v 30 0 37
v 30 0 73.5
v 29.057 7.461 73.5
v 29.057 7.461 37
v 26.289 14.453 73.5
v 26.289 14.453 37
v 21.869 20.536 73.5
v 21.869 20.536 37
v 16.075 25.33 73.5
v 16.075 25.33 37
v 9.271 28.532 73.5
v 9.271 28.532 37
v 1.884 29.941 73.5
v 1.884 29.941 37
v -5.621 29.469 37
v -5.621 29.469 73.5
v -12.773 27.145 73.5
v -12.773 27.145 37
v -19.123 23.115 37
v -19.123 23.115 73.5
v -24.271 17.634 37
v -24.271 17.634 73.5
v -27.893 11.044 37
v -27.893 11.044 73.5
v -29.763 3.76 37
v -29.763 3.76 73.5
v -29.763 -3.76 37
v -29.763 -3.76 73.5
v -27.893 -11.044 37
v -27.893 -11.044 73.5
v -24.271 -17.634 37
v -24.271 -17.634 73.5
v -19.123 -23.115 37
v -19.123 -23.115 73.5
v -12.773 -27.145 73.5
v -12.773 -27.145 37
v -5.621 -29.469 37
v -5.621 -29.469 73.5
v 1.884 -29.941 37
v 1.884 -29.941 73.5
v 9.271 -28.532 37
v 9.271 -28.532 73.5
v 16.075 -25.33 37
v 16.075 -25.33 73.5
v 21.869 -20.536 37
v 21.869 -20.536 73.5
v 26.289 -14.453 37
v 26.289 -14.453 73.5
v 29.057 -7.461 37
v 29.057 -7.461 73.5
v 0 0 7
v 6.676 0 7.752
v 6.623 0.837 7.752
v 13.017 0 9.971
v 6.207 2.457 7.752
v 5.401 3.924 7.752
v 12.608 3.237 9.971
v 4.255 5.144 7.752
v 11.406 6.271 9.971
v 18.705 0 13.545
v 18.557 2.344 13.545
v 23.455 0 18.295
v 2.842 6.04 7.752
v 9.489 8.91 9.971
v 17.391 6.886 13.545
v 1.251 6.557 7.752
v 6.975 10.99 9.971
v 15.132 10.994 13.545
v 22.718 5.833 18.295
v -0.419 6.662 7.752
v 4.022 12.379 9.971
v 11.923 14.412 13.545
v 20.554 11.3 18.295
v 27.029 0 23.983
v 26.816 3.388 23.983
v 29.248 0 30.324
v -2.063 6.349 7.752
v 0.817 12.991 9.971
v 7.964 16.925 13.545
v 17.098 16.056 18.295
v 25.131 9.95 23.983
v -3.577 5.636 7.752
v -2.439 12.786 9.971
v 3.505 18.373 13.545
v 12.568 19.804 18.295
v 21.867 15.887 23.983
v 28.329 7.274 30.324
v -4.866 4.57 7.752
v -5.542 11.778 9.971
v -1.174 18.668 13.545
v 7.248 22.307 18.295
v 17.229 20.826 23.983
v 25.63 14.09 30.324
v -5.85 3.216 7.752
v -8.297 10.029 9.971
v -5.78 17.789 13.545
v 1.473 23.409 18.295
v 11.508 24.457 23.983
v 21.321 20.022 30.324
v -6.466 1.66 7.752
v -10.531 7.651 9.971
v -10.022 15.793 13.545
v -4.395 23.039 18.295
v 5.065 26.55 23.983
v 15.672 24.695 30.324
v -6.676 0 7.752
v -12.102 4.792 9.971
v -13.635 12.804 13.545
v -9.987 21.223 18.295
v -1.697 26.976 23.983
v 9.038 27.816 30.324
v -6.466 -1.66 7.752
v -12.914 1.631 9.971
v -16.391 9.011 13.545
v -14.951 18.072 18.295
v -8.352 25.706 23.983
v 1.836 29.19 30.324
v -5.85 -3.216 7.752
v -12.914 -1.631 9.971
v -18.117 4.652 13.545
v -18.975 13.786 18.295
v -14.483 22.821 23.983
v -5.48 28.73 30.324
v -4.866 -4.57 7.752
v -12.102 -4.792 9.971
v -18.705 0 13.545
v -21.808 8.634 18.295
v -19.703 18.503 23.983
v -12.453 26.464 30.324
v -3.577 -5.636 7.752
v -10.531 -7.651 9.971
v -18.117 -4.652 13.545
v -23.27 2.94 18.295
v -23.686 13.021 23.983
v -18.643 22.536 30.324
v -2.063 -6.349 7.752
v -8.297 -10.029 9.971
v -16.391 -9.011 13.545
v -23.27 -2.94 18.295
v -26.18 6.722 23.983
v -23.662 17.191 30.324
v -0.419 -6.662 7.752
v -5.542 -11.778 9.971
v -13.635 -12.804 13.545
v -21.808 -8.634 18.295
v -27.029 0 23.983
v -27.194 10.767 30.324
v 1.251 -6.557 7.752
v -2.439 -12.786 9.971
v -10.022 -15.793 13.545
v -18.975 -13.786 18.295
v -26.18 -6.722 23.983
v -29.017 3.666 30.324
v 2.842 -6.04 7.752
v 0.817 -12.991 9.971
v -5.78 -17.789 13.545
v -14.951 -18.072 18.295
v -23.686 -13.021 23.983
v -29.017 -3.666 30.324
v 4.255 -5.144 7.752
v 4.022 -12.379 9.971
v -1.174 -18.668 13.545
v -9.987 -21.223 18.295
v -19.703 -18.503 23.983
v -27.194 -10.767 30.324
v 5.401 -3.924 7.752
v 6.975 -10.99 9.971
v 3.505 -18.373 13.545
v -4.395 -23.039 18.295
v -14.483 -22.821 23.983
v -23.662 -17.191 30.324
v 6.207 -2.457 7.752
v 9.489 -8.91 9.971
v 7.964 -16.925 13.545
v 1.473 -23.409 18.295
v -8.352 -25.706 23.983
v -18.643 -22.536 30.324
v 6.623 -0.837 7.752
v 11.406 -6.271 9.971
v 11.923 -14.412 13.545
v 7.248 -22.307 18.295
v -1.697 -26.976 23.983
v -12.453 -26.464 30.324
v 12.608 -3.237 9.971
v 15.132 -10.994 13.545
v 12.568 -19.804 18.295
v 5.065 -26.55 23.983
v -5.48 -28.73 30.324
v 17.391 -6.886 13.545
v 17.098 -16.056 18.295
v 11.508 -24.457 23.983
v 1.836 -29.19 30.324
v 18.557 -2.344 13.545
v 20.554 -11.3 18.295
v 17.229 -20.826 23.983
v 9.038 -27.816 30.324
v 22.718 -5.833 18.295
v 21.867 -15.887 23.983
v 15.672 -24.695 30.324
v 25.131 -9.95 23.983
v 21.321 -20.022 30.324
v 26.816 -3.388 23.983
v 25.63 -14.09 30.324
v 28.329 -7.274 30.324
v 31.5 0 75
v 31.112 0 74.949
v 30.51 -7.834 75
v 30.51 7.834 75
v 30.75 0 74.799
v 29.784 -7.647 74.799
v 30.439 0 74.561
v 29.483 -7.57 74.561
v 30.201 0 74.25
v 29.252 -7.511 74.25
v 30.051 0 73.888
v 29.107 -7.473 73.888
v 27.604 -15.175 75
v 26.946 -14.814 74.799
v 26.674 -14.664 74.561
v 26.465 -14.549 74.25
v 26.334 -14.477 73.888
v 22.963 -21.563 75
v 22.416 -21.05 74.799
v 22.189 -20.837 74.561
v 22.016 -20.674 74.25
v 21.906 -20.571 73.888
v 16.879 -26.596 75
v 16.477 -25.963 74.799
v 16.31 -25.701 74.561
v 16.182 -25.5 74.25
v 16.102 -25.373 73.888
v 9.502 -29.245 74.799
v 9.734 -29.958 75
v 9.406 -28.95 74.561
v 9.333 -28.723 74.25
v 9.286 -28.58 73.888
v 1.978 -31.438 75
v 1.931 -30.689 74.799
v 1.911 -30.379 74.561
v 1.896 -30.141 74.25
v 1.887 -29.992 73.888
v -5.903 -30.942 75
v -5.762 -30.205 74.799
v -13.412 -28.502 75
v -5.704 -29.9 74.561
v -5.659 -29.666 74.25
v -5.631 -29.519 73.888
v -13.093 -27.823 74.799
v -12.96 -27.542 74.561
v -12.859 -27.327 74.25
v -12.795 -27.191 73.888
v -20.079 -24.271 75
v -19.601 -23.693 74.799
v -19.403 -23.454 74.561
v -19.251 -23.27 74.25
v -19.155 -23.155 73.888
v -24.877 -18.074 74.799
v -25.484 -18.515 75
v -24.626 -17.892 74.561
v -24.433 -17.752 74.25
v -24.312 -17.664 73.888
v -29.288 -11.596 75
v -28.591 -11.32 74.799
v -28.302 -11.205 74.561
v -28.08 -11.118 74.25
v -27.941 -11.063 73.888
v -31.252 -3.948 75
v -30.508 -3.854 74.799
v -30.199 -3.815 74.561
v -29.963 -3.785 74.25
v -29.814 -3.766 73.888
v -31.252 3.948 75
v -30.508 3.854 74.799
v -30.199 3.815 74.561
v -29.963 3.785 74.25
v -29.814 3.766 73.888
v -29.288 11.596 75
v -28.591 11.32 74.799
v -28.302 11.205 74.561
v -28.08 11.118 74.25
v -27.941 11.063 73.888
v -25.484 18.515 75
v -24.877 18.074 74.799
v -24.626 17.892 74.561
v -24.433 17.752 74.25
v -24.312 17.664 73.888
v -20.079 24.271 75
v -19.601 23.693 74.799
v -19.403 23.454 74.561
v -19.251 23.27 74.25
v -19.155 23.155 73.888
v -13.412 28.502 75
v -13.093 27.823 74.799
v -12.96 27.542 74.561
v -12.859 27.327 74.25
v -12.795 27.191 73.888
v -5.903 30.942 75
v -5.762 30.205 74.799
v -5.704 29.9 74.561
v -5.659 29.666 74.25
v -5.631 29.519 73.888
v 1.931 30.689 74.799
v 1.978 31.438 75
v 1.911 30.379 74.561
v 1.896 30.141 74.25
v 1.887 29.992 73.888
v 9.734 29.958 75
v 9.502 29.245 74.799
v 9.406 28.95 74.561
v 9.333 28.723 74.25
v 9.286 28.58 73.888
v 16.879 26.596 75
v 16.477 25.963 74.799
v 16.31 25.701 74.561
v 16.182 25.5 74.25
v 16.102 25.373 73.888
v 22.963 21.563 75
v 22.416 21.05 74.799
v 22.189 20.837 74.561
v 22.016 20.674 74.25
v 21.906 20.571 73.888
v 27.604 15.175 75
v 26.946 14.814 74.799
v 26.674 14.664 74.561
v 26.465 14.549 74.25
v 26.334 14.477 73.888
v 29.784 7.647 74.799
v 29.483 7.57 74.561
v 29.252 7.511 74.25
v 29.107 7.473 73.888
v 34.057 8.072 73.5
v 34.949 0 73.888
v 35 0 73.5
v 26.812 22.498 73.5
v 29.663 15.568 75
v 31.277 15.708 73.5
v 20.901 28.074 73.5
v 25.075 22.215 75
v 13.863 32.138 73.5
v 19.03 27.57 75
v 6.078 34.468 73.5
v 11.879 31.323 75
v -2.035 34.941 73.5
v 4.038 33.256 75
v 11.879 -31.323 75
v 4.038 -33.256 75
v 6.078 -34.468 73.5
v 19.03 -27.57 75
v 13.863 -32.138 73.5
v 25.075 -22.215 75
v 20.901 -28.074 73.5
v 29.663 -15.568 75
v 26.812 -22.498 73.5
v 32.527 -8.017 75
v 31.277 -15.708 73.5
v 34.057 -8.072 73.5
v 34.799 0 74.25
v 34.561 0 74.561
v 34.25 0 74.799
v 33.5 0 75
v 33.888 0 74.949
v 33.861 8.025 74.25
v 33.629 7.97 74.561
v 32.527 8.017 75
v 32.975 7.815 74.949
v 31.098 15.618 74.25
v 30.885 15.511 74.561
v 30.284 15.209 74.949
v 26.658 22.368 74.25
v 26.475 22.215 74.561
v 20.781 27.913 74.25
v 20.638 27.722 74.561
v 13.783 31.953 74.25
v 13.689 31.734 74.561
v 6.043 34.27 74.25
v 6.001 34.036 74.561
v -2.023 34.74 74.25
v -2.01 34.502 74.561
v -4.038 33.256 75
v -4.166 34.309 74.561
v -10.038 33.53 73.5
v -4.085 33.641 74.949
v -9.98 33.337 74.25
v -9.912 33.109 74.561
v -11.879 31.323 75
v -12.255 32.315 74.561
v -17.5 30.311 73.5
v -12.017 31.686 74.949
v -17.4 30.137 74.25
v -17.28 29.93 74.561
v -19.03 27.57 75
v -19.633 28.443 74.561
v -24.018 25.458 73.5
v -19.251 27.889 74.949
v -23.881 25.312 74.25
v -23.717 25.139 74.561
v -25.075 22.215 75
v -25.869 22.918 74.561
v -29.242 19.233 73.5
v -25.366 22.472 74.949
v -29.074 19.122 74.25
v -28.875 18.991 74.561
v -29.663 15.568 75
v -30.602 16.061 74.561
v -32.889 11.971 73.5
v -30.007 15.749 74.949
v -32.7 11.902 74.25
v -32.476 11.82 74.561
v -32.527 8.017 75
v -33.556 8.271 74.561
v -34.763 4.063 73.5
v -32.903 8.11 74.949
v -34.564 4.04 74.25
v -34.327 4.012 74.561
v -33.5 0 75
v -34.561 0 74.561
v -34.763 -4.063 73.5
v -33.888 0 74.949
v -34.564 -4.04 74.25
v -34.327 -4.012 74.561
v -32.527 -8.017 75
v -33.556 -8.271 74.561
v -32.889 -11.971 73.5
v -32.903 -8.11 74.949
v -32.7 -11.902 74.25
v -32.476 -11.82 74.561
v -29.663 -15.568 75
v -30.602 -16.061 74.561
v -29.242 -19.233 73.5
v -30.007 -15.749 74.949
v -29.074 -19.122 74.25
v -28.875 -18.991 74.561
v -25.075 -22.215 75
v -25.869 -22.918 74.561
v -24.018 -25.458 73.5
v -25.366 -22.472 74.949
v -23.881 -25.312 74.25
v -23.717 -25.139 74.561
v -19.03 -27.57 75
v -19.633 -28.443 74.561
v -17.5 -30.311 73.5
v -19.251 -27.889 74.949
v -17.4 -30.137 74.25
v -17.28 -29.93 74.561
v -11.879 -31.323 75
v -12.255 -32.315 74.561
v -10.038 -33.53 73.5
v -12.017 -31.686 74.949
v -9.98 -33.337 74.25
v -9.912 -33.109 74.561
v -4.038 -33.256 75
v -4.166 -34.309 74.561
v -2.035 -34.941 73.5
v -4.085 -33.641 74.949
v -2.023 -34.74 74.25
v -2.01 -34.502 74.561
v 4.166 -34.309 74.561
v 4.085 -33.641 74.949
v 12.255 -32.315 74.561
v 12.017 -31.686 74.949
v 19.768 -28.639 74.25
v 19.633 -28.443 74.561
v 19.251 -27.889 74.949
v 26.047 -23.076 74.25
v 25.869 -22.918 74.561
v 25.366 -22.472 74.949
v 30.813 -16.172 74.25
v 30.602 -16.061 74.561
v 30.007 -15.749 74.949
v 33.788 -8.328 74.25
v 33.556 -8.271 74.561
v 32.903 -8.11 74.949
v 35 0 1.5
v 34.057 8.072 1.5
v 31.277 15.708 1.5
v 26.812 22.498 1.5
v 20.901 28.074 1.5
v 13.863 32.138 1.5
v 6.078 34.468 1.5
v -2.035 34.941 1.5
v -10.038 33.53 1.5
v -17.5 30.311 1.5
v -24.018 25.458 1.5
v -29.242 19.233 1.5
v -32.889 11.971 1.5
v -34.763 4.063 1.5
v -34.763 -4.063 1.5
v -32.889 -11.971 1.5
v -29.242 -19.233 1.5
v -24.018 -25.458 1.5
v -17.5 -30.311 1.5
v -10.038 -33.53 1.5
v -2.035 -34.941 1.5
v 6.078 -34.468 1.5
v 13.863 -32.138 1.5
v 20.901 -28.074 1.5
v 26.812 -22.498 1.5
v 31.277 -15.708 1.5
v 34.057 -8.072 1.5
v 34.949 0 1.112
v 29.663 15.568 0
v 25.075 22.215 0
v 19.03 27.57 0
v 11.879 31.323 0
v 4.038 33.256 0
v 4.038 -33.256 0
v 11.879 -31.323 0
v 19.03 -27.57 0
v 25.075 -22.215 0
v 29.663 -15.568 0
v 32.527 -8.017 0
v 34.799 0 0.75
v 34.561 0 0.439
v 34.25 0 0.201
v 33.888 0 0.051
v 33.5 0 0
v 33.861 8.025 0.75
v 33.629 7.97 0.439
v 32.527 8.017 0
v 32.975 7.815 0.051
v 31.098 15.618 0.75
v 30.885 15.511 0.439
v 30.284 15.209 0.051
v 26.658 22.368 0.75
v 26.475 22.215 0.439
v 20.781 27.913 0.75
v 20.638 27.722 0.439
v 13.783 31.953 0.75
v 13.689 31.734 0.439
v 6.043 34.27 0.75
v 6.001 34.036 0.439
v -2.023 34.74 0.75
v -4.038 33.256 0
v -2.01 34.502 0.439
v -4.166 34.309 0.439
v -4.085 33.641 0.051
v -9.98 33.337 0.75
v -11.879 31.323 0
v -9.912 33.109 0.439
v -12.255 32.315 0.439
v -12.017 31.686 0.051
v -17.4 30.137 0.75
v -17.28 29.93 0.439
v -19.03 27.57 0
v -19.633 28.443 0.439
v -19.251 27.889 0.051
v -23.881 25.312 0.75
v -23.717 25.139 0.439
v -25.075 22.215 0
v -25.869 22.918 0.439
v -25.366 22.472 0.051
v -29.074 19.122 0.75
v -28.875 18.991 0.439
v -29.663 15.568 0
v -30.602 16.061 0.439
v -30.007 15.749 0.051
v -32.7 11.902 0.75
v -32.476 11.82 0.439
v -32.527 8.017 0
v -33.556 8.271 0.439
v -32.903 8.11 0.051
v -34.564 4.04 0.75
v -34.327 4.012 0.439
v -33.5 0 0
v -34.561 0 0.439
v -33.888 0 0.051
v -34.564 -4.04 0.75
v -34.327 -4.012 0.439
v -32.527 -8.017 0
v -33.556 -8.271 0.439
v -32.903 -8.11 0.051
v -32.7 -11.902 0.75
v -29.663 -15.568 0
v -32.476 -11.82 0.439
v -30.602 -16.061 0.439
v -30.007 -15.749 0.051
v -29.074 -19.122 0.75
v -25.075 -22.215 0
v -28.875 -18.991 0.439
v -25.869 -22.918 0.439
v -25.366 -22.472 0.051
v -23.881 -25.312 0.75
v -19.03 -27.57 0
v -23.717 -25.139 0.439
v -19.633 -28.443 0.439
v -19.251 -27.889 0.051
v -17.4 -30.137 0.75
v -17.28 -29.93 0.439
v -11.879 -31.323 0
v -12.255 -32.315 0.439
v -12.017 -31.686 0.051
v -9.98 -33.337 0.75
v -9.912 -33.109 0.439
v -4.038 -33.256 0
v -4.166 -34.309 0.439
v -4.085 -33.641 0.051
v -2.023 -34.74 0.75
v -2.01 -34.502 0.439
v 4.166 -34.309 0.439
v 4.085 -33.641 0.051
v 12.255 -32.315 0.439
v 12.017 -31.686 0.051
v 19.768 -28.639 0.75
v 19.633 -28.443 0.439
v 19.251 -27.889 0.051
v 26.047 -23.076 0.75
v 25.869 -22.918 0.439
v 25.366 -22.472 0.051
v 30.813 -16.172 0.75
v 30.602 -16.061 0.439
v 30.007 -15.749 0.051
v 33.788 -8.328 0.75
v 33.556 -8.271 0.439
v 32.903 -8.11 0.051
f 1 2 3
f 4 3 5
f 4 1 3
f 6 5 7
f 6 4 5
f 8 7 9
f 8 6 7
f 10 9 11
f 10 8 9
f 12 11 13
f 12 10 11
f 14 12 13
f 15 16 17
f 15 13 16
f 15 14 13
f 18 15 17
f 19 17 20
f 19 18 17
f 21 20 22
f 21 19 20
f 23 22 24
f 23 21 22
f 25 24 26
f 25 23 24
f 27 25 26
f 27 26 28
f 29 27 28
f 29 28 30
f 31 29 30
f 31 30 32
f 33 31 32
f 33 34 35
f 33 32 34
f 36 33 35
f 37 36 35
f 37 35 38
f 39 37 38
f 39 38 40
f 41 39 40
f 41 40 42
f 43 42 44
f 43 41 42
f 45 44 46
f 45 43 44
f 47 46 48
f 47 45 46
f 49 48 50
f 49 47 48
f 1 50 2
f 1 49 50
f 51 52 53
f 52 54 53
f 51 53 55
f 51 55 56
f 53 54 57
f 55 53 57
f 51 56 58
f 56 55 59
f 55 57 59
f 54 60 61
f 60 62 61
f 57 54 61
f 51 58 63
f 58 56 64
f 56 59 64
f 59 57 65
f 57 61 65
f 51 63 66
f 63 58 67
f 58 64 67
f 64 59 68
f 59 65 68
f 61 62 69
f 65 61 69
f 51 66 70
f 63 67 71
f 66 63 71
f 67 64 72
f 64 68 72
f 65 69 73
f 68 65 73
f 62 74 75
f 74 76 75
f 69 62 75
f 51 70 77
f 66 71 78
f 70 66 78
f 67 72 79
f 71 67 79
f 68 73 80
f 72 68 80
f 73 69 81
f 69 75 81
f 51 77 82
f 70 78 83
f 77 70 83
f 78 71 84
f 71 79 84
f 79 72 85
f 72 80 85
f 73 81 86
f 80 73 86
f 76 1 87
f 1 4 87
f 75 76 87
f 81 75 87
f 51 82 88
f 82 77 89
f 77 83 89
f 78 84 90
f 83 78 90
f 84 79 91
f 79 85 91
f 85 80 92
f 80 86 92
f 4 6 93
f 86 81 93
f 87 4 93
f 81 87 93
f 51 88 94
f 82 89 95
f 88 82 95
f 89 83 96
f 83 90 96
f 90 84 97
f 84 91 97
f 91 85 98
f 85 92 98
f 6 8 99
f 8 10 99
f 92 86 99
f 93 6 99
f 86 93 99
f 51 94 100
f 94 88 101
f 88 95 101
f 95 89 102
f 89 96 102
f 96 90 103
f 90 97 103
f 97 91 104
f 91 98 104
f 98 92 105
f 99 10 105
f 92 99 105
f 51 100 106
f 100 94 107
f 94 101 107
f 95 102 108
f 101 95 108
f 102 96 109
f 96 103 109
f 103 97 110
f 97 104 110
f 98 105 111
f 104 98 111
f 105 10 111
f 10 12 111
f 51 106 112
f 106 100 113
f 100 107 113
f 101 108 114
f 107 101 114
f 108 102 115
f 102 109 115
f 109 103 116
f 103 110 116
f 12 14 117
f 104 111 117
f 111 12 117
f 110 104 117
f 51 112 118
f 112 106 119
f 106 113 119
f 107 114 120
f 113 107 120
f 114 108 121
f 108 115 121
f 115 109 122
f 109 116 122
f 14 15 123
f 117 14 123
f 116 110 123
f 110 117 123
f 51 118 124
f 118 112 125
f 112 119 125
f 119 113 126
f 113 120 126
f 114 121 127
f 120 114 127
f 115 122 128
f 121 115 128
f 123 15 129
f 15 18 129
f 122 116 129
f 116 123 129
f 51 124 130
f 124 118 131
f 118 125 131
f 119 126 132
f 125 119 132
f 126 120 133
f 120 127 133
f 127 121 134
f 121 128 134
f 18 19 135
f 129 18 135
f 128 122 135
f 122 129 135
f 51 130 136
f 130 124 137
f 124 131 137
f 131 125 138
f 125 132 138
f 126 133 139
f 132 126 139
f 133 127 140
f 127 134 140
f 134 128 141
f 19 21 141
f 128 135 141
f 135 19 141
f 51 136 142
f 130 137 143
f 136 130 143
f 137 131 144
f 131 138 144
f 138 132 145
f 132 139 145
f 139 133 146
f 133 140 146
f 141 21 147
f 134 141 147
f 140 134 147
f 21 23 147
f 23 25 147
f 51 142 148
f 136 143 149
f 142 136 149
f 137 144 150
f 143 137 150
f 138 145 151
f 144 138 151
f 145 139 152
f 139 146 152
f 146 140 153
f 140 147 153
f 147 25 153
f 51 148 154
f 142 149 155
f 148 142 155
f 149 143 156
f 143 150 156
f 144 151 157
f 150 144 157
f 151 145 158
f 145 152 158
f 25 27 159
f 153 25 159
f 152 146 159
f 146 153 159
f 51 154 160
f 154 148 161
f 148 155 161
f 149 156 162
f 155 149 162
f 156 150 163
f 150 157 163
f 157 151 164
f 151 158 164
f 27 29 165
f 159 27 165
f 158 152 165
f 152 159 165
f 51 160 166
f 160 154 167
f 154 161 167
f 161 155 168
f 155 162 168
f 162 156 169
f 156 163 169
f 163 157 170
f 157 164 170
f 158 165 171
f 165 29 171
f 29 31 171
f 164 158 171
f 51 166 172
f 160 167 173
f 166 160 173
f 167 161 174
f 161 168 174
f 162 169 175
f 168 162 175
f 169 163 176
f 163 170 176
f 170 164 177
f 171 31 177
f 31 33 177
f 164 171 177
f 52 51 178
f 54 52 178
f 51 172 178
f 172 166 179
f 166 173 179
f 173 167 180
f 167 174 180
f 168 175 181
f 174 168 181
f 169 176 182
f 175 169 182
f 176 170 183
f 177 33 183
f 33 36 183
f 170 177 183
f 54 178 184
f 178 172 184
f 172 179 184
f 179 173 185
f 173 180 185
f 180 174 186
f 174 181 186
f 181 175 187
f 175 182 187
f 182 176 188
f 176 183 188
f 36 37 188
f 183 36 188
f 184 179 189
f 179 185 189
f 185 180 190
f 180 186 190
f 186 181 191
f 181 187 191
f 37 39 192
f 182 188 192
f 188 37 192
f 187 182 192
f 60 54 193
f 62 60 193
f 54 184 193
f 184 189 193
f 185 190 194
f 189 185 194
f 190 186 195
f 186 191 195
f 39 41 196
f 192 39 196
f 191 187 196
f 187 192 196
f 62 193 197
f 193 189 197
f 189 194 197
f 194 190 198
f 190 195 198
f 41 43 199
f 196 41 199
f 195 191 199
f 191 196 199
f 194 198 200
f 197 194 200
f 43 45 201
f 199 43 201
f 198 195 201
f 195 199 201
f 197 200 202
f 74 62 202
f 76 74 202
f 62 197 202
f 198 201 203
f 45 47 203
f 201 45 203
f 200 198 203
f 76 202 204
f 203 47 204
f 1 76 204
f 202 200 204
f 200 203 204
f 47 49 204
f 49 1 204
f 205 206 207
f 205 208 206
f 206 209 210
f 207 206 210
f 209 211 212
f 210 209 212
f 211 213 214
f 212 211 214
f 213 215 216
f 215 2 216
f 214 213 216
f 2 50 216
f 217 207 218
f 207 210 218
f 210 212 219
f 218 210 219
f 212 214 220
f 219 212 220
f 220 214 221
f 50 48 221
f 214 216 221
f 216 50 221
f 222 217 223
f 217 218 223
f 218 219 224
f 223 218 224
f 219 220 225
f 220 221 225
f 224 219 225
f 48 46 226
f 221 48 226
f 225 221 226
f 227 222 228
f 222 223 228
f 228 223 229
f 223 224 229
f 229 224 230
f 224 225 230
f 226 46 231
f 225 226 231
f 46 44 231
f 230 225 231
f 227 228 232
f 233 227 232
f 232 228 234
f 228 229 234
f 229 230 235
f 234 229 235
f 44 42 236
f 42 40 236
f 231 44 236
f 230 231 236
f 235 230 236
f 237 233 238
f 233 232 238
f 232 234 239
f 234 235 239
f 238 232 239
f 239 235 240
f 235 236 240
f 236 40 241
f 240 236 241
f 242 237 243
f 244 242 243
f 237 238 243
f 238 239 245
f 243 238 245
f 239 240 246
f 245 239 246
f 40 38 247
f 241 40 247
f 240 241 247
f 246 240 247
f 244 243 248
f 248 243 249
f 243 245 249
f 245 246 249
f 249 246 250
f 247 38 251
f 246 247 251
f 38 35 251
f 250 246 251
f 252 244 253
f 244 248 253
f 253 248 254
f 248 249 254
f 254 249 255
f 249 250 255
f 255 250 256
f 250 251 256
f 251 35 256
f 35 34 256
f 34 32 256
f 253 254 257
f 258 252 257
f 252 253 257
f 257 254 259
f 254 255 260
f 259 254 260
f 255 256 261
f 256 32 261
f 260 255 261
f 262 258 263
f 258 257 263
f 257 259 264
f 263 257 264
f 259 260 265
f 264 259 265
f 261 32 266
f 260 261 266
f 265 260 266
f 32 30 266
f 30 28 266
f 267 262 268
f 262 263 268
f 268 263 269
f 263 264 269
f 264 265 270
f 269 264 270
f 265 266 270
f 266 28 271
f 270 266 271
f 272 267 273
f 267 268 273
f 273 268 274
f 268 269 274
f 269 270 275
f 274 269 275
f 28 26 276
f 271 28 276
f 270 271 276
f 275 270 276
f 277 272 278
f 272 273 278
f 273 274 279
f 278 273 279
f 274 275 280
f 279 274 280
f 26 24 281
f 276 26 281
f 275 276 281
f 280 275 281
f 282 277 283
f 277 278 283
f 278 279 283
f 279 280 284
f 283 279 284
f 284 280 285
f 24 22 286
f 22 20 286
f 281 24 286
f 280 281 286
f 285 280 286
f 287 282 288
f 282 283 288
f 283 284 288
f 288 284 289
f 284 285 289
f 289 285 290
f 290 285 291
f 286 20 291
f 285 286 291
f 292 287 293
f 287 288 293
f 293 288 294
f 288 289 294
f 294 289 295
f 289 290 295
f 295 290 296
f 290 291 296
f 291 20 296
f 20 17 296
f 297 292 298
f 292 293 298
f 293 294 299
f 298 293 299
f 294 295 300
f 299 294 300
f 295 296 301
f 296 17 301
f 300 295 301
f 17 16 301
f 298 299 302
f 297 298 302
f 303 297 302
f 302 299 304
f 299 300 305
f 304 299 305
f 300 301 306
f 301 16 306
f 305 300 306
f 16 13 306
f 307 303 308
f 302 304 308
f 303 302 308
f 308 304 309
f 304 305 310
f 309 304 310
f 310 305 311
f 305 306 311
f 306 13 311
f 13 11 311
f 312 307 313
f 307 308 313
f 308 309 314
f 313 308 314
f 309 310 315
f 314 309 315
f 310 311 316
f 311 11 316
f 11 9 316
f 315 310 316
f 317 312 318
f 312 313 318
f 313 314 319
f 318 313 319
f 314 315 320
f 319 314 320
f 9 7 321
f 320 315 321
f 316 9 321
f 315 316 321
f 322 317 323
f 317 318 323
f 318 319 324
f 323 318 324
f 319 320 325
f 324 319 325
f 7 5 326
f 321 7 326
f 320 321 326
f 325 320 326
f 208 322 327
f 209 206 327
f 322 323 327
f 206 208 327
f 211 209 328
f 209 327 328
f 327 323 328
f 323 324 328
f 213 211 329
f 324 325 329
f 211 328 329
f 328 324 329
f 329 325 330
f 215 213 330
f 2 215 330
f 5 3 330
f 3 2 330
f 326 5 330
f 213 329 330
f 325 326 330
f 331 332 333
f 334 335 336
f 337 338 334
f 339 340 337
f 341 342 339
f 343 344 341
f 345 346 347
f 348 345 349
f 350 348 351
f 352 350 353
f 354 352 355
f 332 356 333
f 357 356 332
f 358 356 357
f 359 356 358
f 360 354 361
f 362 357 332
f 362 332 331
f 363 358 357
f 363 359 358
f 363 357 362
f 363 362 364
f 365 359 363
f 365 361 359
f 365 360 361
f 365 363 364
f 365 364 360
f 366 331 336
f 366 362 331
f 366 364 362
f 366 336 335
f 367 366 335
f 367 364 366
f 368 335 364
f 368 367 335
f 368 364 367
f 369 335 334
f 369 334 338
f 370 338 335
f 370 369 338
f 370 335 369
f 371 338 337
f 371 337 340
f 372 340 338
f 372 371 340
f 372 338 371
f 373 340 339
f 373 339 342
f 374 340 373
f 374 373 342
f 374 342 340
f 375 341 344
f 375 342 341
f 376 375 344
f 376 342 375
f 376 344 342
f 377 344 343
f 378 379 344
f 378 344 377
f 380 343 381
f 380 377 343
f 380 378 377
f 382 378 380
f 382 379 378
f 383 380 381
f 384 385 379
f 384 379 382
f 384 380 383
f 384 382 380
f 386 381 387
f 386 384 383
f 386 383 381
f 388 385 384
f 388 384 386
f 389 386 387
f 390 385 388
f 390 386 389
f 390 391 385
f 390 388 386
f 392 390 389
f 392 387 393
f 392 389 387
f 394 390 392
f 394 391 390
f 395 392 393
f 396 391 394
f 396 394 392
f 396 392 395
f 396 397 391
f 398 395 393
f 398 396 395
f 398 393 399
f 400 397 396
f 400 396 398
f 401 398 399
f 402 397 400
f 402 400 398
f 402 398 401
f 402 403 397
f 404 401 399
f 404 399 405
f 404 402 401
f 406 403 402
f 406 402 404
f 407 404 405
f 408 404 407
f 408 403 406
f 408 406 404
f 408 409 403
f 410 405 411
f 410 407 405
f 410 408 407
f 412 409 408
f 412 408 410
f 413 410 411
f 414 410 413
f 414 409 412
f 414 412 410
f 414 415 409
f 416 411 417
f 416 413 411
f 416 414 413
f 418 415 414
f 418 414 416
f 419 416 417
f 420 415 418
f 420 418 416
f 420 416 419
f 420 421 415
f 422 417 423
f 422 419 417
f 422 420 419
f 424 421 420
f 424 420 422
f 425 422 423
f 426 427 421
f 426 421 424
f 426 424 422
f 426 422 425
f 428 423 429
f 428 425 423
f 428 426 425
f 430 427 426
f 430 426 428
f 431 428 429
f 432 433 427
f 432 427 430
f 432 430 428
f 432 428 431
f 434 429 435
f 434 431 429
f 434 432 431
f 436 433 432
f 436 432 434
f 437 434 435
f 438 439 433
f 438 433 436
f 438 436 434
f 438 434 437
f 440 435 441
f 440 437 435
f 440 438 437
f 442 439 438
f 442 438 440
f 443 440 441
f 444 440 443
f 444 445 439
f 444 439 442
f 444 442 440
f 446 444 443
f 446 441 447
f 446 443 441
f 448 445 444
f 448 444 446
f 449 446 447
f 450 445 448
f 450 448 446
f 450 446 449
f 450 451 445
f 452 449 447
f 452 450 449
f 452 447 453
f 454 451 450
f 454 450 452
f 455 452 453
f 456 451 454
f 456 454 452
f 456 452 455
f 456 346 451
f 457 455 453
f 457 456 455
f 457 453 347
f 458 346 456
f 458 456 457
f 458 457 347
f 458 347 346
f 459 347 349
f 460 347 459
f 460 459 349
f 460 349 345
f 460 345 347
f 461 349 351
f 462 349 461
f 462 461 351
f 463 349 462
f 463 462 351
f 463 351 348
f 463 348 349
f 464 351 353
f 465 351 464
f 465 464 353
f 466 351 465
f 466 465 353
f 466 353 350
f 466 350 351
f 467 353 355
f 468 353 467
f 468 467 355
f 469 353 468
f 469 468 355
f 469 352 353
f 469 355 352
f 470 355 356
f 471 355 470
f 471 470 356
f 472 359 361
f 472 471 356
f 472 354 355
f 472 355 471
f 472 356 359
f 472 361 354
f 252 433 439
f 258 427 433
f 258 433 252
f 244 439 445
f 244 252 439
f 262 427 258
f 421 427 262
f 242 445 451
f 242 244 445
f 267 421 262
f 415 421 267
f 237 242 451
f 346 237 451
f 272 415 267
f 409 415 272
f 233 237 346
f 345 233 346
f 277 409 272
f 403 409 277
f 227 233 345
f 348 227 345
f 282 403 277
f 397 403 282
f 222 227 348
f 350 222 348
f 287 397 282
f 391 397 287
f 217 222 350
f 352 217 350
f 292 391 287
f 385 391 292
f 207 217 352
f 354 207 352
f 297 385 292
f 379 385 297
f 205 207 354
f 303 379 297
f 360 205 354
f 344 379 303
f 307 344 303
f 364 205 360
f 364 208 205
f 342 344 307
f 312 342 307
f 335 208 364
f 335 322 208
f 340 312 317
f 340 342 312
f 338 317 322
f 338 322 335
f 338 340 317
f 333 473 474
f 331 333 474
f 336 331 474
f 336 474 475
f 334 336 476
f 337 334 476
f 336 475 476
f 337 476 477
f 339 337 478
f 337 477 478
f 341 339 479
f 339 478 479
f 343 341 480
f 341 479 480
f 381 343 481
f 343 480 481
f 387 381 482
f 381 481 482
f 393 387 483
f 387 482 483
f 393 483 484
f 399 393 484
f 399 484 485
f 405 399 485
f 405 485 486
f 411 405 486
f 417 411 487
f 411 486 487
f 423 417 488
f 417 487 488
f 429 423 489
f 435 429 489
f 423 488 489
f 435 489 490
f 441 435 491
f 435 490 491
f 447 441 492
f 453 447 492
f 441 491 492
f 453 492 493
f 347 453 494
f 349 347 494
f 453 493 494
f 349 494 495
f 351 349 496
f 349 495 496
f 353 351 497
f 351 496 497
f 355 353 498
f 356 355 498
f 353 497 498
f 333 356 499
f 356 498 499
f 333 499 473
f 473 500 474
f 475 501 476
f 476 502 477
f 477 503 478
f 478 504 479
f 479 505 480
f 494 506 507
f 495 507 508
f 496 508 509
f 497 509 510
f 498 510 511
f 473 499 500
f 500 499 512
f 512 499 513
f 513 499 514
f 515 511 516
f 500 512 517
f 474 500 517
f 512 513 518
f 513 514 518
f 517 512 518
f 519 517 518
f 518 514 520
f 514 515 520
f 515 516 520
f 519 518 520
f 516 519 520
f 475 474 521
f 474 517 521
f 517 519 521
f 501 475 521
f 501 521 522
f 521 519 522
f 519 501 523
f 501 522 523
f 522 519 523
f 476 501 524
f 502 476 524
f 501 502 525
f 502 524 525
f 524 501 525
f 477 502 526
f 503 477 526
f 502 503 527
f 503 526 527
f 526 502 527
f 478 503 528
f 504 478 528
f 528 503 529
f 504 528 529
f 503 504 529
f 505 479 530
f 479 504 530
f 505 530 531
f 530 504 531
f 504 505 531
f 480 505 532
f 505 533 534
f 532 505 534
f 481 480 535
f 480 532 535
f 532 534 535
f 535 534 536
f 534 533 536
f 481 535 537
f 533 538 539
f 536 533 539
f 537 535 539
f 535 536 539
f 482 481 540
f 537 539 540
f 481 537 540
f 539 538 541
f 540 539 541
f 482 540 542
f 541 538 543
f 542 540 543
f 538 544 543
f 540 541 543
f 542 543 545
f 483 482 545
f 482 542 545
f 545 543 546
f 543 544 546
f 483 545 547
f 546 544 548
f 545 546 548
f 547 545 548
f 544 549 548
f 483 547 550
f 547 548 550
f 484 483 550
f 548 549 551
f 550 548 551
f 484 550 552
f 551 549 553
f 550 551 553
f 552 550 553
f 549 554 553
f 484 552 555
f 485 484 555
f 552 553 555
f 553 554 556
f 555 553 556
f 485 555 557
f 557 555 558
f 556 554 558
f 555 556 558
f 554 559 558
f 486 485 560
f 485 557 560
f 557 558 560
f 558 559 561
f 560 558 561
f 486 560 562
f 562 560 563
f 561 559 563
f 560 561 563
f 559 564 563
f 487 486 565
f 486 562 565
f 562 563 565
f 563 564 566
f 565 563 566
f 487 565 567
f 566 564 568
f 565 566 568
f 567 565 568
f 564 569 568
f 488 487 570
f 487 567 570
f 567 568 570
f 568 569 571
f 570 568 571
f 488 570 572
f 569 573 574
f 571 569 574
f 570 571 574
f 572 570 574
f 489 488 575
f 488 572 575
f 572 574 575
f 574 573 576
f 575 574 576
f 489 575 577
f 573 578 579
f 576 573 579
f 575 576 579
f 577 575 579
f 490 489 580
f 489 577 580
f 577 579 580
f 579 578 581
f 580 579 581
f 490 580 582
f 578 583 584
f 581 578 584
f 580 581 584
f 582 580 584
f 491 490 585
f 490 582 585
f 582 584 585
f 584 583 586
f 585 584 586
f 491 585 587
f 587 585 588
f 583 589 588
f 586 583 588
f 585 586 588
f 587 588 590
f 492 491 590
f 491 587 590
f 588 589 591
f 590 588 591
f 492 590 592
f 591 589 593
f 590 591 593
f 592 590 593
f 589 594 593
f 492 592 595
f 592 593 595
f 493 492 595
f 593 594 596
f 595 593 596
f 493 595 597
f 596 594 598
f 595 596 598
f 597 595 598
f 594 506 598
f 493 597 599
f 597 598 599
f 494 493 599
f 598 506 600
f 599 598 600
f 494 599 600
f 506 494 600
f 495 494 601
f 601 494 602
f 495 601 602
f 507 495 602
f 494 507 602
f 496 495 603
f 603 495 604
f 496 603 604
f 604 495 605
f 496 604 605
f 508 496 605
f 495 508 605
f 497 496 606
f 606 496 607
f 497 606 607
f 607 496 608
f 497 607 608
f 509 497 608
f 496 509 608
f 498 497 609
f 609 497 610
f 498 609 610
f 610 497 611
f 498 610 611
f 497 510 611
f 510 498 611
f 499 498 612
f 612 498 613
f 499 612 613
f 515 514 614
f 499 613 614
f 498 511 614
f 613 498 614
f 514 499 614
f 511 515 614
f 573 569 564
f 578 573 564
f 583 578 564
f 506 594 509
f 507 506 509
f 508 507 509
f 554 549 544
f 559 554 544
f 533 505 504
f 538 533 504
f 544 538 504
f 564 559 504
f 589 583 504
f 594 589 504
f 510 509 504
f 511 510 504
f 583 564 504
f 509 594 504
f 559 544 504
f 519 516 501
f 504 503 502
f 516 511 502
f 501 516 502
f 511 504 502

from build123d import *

# Parameters (mm, degrees)
CYLINDER001_R     = 30
CYLINDER001_DEPTH = 75
CYLINDER_R        = 35
CYLINDER_DEPTH    = 75
FILLET_R          = 1.5


with BuildPart() as cylinder001:
    # Cylinder001 → Cylinder001 (new body)
    with BuildSketch(Plane.XY.offset(37)):
        Circle(CYLINDER001_R)
    extrude(amount=CYLINDER001_DEPTH)


with BuildPart() as fusion:
    # Sphere → Sphere (revolve)
    with BuildSketch(Plane(origin=(0, 0, 37), x_dir=(1, 0, 0), z_dir=(0, -1, 0))):
        with BuildLine():
            ThreePointArc((0, -30), (30, 0), (0, 30))
            Line((0, 30), (0, -30))
        make_face()
    revolve(axis=Axis((0, 0, 37), (0, 0, 1)))

    # Fusion: union Cylinder001
    add(cylinder001.part)


with BuildPart() as fillet_body:
    # Cylinder → Cylinder (new body)
    with BuildSketch(Plane.XY):
        Circle(CYLINDER_R)
    extrude(amount=CYLINDER_DEPTH)

    # Cut: cut Fusion
    add(fusion.part, mode=Mode.SUBTRACT)

    # Fillet
    fillet_edges = [fillet_body.edges().sort_by_distance(p)[0] for p in [
        (-35, 0, 0),
        (-35, 0, 75),
        (-30, 0, 75),
    ]]
    fillet(fillet_edges, radius=FILLET_R)


solid = fillet_body.part
